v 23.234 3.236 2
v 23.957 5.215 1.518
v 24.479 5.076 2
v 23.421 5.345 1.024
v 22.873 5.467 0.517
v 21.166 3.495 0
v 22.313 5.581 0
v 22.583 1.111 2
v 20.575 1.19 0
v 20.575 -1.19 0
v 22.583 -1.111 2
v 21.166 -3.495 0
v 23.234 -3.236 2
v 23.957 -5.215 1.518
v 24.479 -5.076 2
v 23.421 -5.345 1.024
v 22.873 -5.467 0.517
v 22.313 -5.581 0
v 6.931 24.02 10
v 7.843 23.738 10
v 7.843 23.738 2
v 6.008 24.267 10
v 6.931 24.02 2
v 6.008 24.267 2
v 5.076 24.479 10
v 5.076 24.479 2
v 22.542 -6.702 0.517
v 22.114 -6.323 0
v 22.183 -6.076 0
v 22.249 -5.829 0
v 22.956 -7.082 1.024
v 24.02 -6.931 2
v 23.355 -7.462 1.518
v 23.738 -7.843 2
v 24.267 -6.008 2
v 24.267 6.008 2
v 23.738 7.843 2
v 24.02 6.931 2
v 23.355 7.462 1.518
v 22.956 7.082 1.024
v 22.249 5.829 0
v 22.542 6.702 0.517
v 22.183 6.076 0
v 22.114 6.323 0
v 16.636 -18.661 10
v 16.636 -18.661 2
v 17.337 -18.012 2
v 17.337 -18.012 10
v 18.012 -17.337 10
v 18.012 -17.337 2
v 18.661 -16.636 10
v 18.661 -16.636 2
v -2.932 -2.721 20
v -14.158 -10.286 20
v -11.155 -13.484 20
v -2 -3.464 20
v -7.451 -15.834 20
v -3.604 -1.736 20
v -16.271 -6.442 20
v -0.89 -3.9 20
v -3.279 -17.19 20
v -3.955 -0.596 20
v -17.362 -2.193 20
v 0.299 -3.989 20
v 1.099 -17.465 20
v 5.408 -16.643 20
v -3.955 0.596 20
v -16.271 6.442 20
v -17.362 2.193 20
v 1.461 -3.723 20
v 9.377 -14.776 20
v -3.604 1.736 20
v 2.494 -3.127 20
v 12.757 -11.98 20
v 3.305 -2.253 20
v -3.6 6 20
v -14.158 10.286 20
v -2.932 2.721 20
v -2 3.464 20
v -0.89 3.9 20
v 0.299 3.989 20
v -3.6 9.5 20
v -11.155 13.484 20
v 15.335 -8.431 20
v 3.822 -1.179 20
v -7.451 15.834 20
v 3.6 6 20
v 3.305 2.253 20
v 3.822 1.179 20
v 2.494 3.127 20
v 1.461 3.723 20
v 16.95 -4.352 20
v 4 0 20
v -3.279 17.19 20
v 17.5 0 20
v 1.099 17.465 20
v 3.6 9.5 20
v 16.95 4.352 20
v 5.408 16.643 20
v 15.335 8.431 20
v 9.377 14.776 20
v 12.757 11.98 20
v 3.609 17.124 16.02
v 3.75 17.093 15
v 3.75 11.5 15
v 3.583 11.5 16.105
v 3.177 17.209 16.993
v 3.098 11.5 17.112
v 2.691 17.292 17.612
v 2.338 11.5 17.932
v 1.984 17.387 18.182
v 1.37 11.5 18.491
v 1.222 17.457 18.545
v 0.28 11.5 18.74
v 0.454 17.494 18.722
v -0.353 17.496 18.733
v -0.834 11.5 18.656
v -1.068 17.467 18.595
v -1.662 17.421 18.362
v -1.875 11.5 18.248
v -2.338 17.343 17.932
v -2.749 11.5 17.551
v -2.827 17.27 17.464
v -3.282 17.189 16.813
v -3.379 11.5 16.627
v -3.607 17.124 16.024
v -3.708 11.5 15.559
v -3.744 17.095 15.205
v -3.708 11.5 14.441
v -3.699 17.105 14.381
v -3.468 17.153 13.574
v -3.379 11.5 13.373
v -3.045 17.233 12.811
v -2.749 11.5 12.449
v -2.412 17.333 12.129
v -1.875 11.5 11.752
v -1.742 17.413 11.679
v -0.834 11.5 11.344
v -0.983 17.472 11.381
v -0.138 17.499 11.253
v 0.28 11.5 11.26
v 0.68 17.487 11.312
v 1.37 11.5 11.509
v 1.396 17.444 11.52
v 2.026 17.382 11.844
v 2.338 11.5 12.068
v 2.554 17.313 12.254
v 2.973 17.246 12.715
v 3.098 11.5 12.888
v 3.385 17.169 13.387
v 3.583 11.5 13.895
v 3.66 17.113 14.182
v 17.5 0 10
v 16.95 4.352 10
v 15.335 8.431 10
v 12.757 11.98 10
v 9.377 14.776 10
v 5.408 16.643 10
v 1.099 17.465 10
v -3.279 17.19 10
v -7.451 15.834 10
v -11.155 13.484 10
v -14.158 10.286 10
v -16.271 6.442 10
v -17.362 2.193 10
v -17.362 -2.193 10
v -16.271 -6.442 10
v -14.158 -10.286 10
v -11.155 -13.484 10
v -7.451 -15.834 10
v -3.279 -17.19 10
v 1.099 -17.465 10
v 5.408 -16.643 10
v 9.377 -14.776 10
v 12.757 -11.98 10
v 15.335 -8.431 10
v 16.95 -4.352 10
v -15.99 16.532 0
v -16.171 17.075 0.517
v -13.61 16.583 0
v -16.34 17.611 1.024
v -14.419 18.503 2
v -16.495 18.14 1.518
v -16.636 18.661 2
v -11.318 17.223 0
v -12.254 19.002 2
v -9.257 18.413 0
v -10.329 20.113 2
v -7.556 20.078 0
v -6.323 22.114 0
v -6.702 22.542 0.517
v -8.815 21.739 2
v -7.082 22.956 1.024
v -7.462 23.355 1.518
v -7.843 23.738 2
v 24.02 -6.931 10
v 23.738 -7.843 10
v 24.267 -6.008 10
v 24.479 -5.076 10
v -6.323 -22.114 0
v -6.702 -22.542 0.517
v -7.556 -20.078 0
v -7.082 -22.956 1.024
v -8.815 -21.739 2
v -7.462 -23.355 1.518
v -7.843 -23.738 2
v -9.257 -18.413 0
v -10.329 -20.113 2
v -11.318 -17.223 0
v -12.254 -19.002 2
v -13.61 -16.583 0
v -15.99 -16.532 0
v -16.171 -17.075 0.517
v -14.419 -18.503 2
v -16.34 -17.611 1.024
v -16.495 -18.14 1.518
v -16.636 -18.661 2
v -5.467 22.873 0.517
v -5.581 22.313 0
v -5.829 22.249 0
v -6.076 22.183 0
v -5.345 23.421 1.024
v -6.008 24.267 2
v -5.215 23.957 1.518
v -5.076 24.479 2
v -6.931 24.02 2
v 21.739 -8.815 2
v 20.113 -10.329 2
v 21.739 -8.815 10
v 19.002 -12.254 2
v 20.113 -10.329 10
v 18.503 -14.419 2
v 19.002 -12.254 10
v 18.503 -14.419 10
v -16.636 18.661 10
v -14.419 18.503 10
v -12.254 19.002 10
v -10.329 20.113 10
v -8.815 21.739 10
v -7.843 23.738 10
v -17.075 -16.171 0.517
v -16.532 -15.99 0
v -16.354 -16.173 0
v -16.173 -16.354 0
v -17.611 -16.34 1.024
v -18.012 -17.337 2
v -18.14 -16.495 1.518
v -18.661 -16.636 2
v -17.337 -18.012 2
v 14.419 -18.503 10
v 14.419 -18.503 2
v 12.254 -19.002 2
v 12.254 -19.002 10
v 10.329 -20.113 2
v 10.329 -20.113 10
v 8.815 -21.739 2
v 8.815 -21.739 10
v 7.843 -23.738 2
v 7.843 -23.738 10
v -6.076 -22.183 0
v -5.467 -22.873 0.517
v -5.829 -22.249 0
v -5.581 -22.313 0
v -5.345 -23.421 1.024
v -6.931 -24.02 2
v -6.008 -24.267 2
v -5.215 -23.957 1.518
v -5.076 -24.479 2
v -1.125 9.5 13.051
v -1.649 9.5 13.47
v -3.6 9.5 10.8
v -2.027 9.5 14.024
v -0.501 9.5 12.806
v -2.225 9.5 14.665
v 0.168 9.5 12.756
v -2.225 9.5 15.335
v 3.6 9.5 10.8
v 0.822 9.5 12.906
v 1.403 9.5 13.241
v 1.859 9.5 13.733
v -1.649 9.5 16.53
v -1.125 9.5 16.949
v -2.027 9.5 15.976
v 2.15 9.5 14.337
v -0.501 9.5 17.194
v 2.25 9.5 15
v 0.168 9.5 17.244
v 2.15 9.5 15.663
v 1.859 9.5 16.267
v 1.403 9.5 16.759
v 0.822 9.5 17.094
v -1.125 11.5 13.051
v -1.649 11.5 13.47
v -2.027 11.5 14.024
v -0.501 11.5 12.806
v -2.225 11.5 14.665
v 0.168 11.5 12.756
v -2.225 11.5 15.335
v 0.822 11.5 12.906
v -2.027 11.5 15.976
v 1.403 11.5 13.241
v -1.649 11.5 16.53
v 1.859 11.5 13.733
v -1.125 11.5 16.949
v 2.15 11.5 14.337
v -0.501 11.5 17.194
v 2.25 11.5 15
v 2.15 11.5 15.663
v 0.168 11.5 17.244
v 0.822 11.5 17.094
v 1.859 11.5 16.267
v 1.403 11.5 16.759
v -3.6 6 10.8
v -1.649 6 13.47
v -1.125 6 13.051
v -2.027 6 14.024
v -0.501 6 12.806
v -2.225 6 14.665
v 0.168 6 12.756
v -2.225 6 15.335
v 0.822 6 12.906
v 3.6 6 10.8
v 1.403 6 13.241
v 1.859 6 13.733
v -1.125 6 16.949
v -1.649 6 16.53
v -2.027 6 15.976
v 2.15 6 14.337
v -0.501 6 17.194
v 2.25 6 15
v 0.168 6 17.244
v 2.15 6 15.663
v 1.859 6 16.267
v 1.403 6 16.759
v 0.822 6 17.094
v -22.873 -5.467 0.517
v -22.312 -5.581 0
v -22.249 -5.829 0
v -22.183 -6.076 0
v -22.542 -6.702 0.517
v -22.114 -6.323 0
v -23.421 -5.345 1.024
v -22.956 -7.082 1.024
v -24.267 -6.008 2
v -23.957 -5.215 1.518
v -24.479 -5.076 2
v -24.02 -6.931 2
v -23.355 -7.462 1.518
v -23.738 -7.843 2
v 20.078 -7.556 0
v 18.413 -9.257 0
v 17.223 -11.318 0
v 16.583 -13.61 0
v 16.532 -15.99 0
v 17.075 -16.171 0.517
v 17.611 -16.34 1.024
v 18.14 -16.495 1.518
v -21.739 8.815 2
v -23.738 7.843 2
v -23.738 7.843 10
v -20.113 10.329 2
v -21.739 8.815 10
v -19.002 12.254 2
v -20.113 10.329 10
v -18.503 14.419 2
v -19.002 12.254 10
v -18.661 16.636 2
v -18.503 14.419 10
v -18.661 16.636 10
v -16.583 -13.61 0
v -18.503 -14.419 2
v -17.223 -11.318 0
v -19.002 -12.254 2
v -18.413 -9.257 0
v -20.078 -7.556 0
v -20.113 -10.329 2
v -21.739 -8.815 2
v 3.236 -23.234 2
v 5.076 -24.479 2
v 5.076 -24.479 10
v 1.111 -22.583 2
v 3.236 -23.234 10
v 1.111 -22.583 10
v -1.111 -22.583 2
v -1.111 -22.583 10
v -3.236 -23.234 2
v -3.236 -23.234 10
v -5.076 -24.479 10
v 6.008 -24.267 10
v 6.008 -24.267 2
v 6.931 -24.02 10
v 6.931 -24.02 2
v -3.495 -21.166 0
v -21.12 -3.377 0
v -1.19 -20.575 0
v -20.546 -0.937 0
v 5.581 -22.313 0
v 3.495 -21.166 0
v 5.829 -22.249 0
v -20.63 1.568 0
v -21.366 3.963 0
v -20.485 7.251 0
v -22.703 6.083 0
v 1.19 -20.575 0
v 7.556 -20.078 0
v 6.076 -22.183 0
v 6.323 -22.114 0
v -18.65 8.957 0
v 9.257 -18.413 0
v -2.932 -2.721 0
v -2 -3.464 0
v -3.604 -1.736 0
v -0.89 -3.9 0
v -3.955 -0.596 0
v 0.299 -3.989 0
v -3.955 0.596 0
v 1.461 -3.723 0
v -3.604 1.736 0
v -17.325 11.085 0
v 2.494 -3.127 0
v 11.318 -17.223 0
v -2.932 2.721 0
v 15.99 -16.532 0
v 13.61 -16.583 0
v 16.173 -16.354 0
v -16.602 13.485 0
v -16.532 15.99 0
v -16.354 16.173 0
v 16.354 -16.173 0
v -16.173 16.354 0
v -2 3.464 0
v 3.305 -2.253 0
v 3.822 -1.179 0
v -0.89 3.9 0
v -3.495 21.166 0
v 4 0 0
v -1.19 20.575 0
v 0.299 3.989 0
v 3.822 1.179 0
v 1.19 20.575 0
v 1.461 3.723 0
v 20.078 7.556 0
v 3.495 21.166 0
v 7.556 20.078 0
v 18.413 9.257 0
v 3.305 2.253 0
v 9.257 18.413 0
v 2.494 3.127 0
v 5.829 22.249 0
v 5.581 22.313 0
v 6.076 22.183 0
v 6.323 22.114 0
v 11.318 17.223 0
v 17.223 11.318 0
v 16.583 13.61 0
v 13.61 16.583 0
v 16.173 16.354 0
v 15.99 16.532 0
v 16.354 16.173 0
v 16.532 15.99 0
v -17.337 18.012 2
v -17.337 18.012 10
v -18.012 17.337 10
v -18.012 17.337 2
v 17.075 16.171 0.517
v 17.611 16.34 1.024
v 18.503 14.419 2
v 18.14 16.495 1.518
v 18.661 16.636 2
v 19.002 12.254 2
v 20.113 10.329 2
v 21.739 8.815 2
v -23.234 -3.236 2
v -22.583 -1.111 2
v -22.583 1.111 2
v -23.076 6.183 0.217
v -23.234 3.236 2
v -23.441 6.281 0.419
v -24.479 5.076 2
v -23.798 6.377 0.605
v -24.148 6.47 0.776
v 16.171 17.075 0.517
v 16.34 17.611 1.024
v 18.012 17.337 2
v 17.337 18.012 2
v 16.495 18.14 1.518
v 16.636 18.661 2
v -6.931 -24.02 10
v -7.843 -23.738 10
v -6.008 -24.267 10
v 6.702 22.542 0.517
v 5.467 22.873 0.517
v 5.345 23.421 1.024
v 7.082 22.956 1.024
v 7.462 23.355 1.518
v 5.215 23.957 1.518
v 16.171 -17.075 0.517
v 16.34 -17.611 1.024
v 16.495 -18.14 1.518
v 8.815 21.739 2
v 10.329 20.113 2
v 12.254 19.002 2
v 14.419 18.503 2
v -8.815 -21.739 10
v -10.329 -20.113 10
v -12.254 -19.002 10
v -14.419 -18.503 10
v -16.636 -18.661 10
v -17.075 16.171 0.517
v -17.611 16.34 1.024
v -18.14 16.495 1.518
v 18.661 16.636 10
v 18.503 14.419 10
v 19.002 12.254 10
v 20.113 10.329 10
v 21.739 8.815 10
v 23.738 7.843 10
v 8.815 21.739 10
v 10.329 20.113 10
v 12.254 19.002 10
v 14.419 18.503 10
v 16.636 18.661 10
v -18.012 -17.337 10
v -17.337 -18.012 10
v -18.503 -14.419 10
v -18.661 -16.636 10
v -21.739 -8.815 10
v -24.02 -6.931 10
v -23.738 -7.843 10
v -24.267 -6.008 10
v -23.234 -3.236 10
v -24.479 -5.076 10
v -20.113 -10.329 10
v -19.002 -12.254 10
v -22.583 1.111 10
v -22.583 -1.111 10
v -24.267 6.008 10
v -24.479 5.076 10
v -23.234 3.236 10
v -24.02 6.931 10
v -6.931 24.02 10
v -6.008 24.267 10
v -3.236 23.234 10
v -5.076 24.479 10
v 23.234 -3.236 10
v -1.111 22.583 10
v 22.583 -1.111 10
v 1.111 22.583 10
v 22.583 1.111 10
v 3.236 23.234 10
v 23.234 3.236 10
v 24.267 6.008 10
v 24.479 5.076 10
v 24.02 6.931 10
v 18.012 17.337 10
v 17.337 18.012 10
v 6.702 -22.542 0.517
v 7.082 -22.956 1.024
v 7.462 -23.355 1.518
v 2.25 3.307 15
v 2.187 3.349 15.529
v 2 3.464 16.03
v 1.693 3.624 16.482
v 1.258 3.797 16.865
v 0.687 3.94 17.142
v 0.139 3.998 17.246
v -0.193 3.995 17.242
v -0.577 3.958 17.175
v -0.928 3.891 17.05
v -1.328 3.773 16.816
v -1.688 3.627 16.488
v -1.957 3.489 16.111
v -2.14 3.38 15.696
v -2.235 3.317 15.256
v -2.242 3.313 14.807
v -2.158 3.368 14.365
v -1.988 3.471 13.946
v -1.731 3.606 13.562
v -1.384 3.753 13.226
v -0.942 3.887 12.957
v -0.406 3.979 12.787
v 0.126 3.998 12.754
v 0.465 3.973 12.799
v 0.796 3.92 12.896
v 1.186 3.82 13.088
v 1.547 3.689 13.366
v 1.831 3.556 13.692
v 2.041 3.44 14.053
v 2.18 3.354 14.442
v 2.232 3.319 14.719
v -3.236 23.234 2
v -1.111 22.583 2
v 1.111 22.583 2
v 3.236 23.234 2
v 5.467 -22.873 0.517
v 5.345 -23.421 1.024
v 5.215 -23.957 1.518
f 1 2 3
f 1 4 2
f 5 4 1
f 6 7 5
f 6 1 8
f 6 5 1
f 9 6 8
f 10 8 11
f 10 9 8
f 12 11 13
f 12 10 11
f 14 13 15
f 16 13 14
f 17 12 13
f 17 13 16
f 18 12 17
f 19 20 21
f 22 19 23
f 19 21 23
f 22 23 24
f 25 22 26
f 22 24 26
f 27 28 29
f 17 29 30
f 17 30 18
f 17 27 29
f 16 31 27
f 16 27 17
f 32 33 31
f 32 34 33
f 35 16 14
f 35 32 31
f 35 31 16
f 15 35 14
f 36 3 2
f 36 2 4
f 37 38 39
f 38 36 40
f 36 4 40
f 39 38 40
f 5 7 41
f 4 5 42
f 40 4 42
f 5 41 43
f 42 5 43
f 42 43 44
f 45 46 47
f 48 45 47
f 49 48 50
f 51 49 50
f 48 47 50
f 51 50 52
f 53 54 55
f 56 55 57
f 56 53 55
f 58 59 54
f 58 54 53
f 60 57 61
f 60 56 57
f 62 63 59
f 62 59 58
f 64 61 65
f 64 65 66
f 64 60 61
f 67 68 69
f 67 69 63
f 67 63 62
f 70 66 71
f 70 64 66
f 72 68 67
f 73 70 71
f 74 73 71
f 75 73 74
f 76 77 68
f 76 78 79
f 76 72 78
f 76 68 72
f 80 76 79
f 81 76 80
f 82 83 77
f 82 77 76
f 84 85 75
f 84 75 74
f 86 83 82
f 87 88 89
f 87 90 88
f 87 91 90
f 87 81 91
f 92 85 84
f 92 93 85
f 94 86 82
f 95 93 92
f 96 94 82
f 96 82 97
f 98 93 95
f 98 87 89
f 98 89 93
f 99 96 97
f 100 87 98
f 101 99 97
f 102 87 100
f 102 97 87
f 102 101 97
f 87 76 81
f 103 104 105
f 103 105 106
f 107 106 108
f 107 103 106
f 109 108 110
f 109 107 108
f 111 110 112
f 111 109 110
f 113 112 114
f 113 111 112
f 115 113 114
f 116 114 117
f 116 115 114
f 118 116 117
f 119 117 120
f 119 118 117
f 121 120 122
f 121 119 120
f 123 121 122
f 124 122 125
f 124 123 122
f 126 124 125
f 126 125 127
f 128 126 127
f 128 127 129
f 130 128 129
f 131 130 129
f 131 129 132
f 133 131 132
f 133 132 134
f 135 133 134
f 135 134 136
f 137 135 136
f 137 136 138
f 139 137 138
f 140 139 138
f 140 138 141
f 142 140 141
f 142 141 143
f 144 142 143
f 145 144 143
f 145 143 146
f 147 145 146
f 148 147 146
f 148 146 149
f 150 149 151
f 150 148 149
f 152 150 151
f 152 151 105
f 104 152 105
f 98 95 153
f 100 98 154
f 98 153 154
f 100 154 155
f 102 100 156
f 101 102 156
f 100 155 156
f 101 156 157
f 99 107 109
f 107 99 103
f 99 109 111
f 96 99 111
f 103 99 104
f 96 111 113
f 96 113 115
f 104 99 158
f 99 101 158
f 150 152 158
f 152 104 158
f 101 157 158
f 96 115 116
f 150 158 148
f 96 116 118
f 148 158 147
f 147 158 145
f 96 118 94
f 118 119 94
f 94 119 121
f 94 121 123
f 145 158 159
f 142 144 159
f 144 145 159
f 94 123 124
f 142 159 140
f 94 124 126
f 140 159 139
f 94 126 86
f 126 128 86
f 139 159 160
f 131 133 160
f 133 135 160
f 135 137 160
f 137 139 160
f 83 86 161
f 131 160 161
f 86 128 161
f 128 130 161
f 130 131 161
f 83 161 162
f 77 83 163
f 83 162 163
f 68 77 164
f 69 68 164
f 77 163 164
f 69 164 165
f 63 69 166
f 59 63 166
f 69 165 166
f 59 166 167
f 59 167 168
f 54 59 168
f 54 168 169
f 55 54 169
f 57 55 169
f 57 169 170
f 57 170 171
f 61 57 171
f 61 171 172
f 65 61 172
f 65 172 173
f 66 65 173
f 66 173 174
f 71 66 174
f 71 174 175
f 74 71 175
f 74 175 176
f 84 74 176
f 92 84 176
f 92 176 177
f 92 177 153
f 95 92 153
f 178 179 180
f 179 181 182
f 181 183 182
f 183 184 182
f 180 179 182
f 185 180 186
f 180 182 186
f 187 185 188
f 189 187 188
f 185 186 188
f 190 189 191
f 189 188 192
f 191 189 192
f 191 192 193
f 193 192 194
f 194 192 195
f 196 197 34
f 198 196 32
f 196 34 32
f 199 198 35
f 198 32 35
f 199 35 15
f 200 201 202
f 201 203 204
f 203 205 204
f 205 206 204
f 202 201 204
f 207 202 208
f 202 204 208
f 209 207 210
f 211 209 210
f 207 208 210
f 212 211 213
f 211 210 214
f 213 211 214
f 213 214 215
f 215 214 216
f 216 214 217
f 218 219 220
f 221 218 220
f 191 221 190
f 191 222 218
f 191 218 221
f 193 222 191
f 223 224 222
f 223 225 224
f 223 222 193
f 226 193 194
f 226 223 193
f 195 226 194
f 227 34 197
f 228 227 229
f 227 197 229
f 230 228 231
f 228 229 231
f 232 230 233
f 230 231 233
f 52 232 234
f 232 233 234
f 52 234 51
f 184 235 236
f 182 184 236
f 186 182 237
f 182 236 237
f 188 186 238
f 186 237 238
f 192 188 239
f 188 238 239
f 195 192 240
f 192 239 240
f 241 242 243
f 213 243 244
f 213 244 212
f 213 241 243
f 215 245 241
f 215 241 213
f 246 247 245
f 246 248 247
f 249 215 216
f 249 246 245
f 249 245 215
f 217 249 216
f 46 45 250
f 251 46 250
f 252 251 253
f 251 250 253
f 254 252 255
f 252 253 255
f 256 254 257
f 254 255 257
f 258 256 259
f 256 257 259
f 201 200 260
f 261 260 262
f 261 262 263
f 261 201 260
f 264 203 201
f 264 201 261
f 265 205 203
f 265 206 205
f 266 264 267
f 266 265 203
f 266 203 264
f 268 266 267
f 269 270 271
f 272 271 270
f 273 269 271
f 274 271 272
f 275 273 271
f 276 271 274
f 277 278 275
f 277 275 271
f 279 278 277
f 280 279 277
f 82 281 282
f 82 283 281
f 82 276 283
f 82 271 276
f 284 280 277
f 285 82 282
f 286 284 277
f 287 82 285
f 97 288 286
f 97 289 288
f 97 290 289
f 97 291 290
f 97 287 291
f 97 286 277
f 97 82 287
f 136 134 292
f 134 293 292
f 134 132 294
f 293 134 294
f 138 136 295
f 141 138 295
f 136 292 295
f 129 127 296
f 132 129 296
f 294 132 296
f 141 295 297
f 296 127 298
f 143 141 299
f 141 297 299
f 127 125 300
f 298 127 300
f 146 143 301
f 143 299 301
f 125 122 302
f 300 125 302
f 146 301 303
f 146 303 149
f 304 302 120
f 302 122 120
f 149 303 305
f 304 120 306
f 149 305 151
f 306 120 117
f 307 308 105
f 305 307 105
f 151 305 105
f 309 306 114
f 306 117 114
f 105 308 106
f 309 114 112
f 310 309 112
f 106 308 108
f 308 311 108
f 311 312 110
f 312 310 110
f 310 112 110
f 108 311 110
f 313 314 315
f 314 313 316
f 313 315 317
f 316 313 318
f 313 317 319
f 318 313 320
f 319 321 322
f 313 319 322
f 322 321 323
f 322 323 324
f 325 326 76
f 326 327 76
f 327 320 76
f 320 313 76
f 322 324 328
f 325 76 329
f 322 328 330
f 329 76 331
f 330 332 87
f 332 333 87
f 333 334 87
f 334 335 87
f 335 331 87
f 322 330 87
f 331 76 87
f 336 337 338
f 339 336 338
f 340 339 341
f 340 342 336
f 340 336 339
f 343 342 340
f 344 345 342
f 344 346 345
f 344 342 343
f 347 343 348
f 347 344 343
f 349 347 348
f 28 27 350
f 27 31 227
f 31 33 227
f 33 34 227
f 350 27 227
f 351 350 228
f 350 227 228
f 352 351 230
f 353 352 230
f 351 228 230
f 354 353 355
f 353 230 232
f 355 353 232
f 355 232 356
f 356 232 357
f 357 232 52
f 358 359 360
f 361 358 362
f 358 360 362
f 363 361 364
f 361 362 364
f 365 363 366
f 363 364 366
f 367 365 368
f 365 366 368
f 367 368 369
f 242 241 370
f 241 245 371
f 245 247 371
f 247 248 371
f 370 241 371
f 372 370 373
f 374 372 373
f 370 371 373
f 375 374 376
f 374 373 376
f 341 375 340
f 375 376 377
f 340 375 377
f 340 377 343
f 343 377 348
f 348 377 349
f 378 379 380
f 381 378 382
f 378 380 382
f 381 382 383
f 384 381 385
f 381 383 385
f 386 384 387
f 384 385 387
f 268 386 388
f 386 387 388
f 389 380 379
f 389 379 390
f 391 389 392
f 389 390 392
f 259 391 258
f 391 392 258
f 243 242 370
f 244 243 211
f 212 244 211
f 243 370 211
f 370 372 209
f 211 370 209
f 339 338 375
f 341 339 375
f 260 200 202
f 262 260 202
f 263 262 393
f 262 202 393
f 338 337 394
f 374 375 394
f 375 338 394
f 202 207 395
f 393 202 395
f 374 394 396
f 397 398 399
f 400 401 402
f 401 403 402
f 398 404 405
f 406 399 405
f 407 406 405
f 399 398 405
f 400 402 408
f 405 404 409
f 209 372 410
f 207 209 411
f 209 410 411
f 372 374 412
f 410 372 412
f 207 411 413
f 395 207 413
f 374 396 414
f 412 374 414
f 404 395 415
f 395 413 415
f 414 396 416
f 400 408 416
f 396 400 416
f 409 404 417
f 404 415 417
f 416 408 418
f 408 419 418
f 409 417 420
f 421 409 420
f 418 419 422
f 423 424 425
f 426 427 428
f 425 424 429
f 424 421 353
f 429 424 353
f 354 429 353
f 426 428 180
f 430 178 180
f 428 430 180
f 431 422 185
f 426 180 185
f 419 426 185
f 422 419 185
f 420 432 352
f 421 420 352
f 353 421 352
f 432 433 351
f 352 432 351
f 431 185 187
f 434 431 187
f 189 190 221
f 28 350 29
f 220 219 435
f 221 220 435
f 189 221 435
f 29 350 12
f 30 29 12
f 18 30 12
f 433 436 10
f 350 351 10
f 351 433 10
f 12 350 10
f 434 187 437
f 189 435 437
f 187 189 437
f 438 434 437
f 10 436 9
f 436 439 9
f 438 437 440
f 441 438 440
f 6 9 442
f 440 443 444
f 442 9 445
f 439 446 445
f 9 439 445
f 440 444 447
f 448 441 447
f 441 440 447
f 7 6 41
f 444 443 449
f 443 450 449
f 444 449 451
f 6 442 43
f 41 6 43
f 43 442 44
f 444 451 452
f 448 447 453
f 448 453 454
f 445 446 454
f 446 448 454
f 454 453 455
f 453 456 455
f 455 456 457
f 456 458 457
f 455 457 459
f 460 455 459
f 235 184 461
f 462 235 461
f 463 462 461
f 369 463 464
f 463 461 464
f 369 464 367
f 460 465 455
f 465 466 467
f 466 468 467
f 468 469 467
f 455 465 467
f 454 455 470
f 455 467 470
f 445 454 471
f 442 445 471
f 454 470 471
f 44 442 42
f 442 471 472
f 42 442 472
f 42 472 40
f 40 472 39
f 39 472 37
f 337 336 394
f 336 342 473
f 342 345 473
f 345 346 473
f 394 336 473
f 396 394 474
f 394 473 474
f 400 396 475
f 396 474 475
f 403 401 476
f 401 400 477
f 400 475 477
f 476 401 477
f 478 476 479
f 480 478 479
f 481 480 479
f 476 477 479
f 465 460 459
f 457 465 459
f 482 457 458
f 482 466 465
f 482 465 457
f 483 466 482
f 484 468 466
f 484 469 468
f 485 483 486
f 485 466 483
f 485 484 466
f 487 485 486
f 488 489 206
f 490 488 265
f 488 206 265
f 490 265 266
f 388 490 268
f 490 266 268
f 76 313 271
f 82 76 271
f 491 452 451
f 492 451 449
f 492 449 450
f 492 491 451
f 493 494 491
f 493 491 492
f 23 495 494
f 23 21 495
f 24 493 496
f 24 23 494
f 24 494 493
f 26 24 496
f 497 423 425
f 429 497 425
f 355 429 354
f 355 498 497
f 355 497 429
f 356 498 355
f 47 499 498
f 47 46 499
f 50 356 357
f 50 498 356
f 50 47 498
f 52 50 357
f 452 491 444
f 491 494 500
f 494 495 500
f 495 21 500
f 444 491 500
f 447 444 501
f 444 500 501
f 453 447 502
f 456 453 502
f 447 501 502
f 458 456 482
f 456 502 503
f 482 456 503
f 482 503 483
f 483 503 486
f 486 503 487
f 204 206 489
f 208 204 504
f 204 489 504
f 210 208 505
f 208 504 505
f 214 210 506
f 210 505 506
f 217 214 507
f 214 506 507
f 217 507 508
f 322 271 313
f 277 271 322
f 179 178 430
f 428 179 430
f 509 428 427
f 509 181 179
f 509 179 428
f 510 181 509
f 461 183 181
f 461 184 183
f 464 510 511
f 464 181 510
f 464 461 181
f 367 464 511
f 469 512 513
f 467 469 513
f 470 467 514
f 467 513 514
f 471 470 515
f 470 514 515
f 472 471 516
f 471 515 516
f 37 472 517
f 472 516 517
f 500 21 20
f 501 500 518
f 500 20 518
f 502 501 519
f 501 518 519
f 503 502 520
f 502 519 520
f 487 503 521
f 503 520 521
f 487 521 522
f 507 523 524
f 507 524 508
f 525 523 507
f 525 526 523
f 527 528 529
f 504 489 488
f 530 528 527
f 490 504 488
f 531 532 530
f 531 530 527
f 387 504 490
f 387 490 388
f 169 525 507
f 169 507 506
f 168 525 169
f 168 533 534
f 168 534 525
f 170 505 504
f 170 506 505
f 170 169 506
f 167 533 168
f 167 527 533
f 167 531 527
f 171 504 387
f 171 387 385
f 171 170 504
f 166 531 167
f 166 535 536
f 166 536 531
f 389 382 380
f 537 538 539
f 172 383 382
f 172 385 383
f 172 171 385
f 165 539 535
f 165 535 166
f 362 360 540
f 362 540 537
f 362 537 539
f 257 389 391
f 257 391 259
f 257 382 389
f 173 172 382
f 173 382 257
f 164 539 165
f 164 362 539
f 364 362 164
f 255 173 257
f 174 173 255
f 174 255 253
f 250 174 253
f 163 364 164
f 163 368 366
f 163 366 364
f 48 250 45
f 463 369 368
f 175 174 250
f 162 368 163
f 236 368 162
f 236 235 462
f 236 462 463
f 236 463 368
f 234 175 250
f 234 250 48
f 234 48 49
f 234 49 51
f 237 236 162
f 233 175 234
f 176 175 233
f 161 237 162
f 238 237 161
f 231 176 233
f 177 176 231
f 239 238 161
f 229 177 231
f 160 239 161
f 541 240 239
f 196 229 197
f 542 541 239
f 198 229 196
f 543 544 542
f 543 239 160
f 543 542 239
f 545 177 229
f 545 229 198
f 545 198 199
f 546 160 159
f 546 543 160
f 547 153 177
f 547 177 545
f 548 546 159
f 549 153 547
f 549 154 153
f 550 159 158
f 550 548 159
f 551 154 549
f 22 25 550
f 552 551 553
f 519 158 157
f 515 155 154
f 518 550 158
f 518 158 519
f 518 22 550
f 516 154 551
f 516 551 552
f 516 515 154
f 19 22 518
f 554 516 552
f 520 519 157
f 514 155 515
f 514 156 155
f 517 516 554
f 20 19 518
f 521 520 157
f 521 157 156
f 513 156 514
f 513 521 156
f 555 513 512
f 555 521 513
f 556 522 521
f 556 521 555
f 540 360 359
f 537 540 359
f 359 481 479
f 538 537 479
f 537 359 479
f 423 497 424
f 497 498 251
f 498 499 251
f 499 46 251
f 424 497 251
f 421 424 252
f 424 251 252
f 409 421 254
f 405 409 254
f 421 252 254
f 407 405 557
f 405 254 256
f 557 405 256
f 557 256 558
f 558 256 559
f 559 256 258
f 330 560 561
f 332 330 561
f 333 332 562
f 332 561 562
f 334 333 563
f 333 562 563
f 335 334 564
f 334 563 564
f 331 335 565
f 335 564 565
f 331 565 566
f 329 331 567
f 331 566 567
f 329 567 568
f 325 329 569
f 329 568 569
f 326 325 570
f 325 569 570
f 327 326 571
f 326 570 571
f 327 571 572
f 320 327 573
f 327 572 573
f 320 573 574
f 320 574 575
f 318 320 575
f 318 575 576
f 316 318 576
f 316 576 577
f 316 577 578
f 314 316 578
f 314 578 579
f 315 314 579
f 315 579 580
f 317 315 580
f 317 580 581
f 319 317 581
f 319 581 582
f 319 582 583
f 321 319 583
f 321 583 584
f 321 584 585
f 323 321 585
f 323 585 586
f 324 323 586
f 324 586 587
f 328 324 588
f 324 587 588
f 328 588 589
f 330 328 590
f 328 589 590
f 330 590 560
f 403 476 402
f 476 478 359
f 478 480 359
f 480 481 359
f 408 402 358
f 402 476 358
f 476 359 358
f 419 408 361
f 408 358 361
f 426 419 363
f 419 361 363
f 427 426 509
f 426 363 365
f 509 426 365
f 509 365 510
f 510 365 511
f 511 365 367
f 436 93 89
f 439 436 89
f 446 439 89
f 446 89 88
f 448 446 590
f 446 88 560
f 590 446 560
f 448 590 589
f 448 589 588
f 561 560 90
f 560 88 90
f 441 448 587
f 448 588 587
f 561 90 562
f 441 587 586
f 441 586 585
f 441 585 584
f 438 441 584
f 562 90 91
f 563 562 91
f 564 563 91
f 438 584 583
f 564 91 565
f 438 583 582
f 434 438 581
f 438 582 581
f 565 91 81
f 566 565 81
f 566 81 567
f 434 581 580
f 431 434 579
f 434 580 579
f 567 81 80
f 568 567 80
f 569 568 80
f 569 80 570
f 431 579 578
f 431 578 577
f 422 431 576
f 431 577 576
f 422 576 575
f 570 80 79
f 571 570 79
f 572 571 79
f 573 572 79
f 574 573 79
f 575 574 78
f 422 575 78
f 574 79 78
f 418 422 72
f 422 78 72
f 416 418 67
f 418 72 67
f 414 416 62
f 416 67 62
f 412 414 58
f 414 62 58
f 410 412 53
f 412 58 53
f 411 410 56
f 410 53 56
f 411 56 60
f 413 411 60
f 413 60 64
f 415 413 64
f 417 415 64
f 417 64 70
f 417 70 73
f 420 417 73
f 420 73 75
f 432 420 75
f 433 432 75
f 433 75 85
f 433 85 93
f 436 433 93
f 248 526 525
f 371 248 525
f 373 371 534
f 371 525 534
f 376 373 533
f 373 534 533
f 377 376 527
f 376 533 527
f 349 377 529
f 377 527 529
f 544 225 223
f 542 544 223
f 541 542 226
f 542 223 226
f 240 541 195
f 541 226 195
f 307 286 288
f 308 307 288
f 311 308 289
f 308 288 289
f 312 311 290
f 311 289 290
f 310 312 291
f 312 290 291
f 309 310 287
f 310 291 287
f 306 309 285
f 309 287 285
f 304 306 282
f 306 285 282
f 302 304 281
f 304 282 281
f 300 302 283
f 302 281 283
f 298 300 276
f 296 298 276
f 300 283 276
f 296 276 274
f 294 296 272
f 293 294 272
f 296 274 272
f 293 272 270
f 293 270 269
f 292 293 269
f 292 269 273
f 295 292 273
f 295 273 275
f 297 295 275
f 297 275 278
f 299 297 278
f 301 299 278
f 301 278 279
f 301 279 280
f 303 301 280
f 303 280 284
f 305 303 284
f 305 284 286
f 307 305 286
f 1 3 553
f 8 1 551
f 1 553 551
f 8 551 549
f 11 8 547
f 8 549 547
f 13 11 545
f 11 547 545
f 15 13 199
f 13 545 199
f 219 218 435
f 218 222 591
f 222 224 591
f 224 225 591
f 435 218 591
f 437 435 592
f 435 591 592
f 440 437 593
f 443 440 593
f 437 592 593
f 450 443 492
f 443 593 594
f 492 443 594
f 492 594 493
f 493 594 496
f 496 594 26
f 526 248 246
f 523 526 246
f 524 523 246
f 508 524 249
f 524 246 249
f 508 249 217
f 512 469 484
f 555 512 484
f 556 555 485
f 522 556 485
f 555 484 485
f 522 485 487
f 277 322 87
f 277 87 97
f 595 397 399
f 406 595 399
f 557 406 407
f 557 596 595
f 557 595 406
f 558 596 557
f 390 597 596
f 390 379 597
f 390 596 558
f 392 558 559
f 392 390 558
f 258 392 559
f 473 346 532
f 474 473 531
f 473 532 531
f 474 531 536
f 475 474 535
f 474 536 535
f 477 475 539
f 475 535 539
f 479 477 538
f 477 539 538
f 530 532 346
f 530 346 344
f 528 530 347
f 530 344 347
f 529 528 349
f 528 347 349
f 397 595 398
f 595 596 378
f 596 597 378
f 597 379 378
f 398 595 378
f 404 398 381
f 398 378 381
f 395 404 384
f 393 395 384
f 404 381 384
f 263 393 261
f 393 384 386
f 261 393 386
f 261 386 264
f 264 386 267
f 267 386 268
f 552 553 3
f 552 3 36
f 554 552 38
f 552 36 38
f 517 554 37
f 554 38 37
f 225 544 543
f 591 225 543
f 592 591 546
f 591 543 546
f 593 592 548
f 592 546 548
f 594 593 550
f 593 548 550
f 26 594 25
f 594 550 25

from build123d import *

# Parameters (mm, degrees)
F0_R         = 25
F1_DEPTH     = 10
F2_R         = 7.5
F3_DEPTH     = 10.001
F4_R         = 17.5
F5_DEPTH     = 10
F6_R         = 4
F7_DEPTH     = 20
F8_R         = 2.25
F9_DEPTH     = 24.4801666667
F10_W        = 7.2
F10_H        = 3.5
F11_DEPTH    = 9.2
F13_R        = 3.75
F14_DEPTH    = 13.5
F15_C1_SIZE  = 2
F15_C2_SIZE  = 2
F15_C3_SIZE  = 2
F15_C4_SIZE  = 2
F15_C5_SIZE  = 2
F15_C6_SIZE  = 2
F15_C7_SIZE  = 2
F15_C8_SIZE  = 2
F15_C9_SIZE  = 2
F15_C10_SIZE = 2
F15_C11_SIZE = 2
F15_C12_SIZE = 2
F15_C13_SIZE = 2
F15_C14_SIZE = 2
F15_C15_SIZE = 2
F15_C16_SIZE = 2
F15_C17_SIZE = 2
F15_C18_SIZE = 2
F15_C19_SIZE = 2
F15_C20_SIZE = 2
F15_C21_SIZE = 2
F15_C22_SIZE = 2
F15_C23_SIZE = 2


with BuildPart() as f1:
    # F0 (on Top) → F1 (new body)
    with BuildSketch(Plane.XY):
        Circle(F0_R)
    extrude(amount=F1_DEPTH)

    # F2 (on face) → F3 (cut, through all)
    with BuildSketch(Plane.XY.offset(10)):
        with Locations((0, 30)):
            Circle(F2_R)
        with Locations((-15, 25.9807621135)):
            Circle(F2_R)
        with Locations((-25.9807621135, 15)):
            Circle(F2_R)
        with Locations((-30, 0)):
            Circle(F2_R)
        with Locations((-25.9807621135, -15)):
            Circle(F2_R)
        with Locations((-15, -25.9807621135)):
            Circle(F2_R)
        with Locations((0, -30)):
            Circle(F2_R)
        with Locations((15, -25.9807621135)):
            Circle(F2_R)
        with Locations((25.9807621135, -15)):
            Circle(F2_R)
        with Locations((30, 0)):
            Circle(F2_R)
        with Locations((25.9807621135, 15)):
            Circle(F2_R)
        with Locations((15, 25.9807621135)):
            Circle(F2_R)
    extrude(amount=-F3_DEPTH, mode=Mode.SUBTRACT)

    # F4 (on face) → F5 (join)
    with BuildSketch(Plane.XY.offset(10)):
        Circle(F4_R)
    extrude(amount=F5_DEPTH)

    # F6 (on face) → F7 (cut, through all)
    with BuildSketch(Plane.XY.offset(20)):
        Circle(F6_R)
    extrude(amount=-F7_DEPTH, mode=Mode.SUBTRACT)

    # F8 (on Front) → F9 (cut, through all)
    with BuildSketch(Plane.XZ):
        with Locations((0, 15)):
            Circle(F8_R)
    extrude(amount=-F9_DEPTH, mode=Mode.SUBTRACT)

    # F10 (on face) → F11 (cut)
    with BuildSketch(Plane.XY.offset(20)):
        with Locations((0, 7.75)):
            Rectangle(F10_W, F10_H)
    extrude(amount=-F11_DEPTH, mode=Mode.SUBTRACT)

    # F13 (on offset) → F14 (cut, through all)
    with BuildSketch(Plane.XZ.offset(-25)):
        with Locations((0, 15)):
            Circle(F13_R)
    extrude(amount=F14_DEPTH, mode=Mode.SUBTRACT)

    # F15: chamfer of 2 on 23 edges, made by hand

    # F15_c1
    f15_c1_edges = [f1.edges().sort_by_distance(p)[0] for p in [
        (24.1481456572, 6.4704761276, 0),
    ]]
    chamfer(f15_c1_edges, length=F15_C1_SIZE)

    # F15_c2
    f15_c2_edges = [f1.edges().sort_by_distance(p)[0] for p in [
        (22.6680317958, -1.5786837087, 0),
    ]]
    chamfer(f15_c2_edges, length=F15_C2_SIZE)

    # F15_c3
    f15_c3_edges = [f1.edges().sort_by_distance(p)[0] for p in [
        (23.8267406055, -7.5687800944, 0),
    ]]
    chamfer(f15_c3_edges, length=F15_C3_SIZE)

    # F15_c4
    f15_c4_edges = [f1.edges().sort_by_distance(p)[0] for p in [
        (18.8417495346, 12.7011960942, 0),
    ]]
    chamfer(f15_c4_edges, length=F15_C4_SIZE)

    # F15_c5
    f15_c5_edges = [f1.edges().sort_by_distance(p)[0] for p in [
        (18.8417495346, -12.7011960942, 0),
    ]]
    chamfer(f15_c5_edges, length=F15_C5_SIZE)

    # F15_c6
    f15_c6_edges = [f1.edges().sort_by_distance(p)[0] for p in [
        (16.8501726066, 18.4681261401, 0),
    ]]
    chamfer(f15_c6_edges, length=F15_C6_SIZE)

    # F15_c7
    f15_c7_edges = [f1.edges().sort_by_distance(p)[0] for p in [
        (16.8501726066, -18.4681261401, 0),
    ]]
    chamfer(f15_c7_edges, length=F15_C7_SIZE)

    # F15_c8
    f15_c8_edges = [f1.edges().sort_by_distance(p)[0] for p in [
        (9.9668357016, 20.4204332433, 0),
    ]]
    chamfer(f15_c8_edges, length=F15_C8_SIZE)

    # F15_c9
    f15_c9_edges = [f1.edges().sort_by_distance(p)[0] for p in [
        (9.9668357016, -20.4204332433, 0),
    ]]
    chamfer(f15_c9_edges, length=F15_C9_SIZE)

    # F15_c10
    f15_c10_edges = [f1.edges().sort_by_distance(p)[0] for p in [
        (5.3586144654, 24.418952701, 0),
    ]]
    chamfer(f15_c10_edges, length=F15_C10_SIZE)

    # F15_c11
    f15_c11_edges = [f1.edges().sort_by_distance(p)[0] for p in [
        (5.3586144654, -24.418952701, 0),
    ]]
    chamfer(f15_c11_edges, length=F15_C11_SIZE)

    # F15_c12
    f15_c12_edges = [f1.edges().sort_by_distance(p)[0] for p in [
        (-1.5786837087, 22.6680317958, 0),
    ]]
    chamfer(f15_c12_edges, length=F15_C12_SIZE)

    # F15_c13
    f15_c13_edges = [f1.edges().sort_by_distance(p)[0] for p in [
        (-1.5786837087, -22.6680317958, 0),
    ]]
    chamfer(f15_c13_edges, length=F15_C13_SIZE)

    # F15_c14
    f15_c14_edges = [f1.edges().sort_by_distance(p)[0] for p in [
        (-7.5687800944, 23.8267406055, 0),
    ]]
    chamfer(f15_c14_edges, length=F15_C14_SIZE)

    # F15_c15
    f15_c15_edges = [f1.edges().sort_by_distance(p)[0] for p in [
        (-7.5687800944, -23.8267406055, 0),
    ]]
    chamfer(f15_c15_edges, length=F15_C15_SIZE)

    # F15_c16
    f15_c16_edges = [f1.edges().sort_by_distance(p)[0] for p in [
        (-12.7011960942, 18.8417495346, 0),
    ]]
    chamfer(f15_c16_edges, length=F15_C16_SIZE)

    # F15_c17
    f15_c17_edges = [f1.edges().sort_by_distance(p)[0] for p in [
        (-12.7011960942, -18.8417495346, 0),
    ]]
    chamfer(f15_c17_edges, length=F15_C17_SIZE)

    # F15_c18
    f15_c18_edges = [f1.edges().sort_by_distance(p)[0] for p in [
        (-18.4681261401, 16.8501726066, 0),
    ]]
    chamfer(f15_c18_edges, length=F15_C18_SIZE)

    # F15_c19
    f15_c19_edges = [f1.edges().sort_by_distance(p)[0] for p in [
        (-18.4681261401, -16.8501726066, 0),
    ]]
    chamfer(f15_c19_edges, length=F15_C19_SIZE)

    # F15_c20
    f15_c20_edges = [f1.edges().sort_by_distance(p)[0] for p in [
        (-20.4204332433, 9.9668357016, 0),
    ]]
    chamfer(f15_c20_edges, length=F15_C20_SIZE)

    # F15_c21
    f15_c21_edges = [f1.edges().sort_by_distance(p)[0] for p in [
        (-20.4204332433, -9.9668357016, 0),
    ]]
    chamfer(f15_c21_edges, length=F15_C21_SIZE)

    # F15_c22
    f15_c22_edges = [f1.edges().sort_by_distance(p)[0] for p in [
        (-24.418952701, -5.3586144654, 0),
    ]]
    chamfer(f15_c22_edges, length=F15_C22_SIZE)

    # F15_c23
    f15_c23_edges = [f1.edges().sort_by_distance(p)[0] for p in [
        (-22.6680317958, 1.5786837087, 0),
    ]]
    chamfer(f15_c23_edges, length=F15_C23_SIZE)


solid = f1.part
